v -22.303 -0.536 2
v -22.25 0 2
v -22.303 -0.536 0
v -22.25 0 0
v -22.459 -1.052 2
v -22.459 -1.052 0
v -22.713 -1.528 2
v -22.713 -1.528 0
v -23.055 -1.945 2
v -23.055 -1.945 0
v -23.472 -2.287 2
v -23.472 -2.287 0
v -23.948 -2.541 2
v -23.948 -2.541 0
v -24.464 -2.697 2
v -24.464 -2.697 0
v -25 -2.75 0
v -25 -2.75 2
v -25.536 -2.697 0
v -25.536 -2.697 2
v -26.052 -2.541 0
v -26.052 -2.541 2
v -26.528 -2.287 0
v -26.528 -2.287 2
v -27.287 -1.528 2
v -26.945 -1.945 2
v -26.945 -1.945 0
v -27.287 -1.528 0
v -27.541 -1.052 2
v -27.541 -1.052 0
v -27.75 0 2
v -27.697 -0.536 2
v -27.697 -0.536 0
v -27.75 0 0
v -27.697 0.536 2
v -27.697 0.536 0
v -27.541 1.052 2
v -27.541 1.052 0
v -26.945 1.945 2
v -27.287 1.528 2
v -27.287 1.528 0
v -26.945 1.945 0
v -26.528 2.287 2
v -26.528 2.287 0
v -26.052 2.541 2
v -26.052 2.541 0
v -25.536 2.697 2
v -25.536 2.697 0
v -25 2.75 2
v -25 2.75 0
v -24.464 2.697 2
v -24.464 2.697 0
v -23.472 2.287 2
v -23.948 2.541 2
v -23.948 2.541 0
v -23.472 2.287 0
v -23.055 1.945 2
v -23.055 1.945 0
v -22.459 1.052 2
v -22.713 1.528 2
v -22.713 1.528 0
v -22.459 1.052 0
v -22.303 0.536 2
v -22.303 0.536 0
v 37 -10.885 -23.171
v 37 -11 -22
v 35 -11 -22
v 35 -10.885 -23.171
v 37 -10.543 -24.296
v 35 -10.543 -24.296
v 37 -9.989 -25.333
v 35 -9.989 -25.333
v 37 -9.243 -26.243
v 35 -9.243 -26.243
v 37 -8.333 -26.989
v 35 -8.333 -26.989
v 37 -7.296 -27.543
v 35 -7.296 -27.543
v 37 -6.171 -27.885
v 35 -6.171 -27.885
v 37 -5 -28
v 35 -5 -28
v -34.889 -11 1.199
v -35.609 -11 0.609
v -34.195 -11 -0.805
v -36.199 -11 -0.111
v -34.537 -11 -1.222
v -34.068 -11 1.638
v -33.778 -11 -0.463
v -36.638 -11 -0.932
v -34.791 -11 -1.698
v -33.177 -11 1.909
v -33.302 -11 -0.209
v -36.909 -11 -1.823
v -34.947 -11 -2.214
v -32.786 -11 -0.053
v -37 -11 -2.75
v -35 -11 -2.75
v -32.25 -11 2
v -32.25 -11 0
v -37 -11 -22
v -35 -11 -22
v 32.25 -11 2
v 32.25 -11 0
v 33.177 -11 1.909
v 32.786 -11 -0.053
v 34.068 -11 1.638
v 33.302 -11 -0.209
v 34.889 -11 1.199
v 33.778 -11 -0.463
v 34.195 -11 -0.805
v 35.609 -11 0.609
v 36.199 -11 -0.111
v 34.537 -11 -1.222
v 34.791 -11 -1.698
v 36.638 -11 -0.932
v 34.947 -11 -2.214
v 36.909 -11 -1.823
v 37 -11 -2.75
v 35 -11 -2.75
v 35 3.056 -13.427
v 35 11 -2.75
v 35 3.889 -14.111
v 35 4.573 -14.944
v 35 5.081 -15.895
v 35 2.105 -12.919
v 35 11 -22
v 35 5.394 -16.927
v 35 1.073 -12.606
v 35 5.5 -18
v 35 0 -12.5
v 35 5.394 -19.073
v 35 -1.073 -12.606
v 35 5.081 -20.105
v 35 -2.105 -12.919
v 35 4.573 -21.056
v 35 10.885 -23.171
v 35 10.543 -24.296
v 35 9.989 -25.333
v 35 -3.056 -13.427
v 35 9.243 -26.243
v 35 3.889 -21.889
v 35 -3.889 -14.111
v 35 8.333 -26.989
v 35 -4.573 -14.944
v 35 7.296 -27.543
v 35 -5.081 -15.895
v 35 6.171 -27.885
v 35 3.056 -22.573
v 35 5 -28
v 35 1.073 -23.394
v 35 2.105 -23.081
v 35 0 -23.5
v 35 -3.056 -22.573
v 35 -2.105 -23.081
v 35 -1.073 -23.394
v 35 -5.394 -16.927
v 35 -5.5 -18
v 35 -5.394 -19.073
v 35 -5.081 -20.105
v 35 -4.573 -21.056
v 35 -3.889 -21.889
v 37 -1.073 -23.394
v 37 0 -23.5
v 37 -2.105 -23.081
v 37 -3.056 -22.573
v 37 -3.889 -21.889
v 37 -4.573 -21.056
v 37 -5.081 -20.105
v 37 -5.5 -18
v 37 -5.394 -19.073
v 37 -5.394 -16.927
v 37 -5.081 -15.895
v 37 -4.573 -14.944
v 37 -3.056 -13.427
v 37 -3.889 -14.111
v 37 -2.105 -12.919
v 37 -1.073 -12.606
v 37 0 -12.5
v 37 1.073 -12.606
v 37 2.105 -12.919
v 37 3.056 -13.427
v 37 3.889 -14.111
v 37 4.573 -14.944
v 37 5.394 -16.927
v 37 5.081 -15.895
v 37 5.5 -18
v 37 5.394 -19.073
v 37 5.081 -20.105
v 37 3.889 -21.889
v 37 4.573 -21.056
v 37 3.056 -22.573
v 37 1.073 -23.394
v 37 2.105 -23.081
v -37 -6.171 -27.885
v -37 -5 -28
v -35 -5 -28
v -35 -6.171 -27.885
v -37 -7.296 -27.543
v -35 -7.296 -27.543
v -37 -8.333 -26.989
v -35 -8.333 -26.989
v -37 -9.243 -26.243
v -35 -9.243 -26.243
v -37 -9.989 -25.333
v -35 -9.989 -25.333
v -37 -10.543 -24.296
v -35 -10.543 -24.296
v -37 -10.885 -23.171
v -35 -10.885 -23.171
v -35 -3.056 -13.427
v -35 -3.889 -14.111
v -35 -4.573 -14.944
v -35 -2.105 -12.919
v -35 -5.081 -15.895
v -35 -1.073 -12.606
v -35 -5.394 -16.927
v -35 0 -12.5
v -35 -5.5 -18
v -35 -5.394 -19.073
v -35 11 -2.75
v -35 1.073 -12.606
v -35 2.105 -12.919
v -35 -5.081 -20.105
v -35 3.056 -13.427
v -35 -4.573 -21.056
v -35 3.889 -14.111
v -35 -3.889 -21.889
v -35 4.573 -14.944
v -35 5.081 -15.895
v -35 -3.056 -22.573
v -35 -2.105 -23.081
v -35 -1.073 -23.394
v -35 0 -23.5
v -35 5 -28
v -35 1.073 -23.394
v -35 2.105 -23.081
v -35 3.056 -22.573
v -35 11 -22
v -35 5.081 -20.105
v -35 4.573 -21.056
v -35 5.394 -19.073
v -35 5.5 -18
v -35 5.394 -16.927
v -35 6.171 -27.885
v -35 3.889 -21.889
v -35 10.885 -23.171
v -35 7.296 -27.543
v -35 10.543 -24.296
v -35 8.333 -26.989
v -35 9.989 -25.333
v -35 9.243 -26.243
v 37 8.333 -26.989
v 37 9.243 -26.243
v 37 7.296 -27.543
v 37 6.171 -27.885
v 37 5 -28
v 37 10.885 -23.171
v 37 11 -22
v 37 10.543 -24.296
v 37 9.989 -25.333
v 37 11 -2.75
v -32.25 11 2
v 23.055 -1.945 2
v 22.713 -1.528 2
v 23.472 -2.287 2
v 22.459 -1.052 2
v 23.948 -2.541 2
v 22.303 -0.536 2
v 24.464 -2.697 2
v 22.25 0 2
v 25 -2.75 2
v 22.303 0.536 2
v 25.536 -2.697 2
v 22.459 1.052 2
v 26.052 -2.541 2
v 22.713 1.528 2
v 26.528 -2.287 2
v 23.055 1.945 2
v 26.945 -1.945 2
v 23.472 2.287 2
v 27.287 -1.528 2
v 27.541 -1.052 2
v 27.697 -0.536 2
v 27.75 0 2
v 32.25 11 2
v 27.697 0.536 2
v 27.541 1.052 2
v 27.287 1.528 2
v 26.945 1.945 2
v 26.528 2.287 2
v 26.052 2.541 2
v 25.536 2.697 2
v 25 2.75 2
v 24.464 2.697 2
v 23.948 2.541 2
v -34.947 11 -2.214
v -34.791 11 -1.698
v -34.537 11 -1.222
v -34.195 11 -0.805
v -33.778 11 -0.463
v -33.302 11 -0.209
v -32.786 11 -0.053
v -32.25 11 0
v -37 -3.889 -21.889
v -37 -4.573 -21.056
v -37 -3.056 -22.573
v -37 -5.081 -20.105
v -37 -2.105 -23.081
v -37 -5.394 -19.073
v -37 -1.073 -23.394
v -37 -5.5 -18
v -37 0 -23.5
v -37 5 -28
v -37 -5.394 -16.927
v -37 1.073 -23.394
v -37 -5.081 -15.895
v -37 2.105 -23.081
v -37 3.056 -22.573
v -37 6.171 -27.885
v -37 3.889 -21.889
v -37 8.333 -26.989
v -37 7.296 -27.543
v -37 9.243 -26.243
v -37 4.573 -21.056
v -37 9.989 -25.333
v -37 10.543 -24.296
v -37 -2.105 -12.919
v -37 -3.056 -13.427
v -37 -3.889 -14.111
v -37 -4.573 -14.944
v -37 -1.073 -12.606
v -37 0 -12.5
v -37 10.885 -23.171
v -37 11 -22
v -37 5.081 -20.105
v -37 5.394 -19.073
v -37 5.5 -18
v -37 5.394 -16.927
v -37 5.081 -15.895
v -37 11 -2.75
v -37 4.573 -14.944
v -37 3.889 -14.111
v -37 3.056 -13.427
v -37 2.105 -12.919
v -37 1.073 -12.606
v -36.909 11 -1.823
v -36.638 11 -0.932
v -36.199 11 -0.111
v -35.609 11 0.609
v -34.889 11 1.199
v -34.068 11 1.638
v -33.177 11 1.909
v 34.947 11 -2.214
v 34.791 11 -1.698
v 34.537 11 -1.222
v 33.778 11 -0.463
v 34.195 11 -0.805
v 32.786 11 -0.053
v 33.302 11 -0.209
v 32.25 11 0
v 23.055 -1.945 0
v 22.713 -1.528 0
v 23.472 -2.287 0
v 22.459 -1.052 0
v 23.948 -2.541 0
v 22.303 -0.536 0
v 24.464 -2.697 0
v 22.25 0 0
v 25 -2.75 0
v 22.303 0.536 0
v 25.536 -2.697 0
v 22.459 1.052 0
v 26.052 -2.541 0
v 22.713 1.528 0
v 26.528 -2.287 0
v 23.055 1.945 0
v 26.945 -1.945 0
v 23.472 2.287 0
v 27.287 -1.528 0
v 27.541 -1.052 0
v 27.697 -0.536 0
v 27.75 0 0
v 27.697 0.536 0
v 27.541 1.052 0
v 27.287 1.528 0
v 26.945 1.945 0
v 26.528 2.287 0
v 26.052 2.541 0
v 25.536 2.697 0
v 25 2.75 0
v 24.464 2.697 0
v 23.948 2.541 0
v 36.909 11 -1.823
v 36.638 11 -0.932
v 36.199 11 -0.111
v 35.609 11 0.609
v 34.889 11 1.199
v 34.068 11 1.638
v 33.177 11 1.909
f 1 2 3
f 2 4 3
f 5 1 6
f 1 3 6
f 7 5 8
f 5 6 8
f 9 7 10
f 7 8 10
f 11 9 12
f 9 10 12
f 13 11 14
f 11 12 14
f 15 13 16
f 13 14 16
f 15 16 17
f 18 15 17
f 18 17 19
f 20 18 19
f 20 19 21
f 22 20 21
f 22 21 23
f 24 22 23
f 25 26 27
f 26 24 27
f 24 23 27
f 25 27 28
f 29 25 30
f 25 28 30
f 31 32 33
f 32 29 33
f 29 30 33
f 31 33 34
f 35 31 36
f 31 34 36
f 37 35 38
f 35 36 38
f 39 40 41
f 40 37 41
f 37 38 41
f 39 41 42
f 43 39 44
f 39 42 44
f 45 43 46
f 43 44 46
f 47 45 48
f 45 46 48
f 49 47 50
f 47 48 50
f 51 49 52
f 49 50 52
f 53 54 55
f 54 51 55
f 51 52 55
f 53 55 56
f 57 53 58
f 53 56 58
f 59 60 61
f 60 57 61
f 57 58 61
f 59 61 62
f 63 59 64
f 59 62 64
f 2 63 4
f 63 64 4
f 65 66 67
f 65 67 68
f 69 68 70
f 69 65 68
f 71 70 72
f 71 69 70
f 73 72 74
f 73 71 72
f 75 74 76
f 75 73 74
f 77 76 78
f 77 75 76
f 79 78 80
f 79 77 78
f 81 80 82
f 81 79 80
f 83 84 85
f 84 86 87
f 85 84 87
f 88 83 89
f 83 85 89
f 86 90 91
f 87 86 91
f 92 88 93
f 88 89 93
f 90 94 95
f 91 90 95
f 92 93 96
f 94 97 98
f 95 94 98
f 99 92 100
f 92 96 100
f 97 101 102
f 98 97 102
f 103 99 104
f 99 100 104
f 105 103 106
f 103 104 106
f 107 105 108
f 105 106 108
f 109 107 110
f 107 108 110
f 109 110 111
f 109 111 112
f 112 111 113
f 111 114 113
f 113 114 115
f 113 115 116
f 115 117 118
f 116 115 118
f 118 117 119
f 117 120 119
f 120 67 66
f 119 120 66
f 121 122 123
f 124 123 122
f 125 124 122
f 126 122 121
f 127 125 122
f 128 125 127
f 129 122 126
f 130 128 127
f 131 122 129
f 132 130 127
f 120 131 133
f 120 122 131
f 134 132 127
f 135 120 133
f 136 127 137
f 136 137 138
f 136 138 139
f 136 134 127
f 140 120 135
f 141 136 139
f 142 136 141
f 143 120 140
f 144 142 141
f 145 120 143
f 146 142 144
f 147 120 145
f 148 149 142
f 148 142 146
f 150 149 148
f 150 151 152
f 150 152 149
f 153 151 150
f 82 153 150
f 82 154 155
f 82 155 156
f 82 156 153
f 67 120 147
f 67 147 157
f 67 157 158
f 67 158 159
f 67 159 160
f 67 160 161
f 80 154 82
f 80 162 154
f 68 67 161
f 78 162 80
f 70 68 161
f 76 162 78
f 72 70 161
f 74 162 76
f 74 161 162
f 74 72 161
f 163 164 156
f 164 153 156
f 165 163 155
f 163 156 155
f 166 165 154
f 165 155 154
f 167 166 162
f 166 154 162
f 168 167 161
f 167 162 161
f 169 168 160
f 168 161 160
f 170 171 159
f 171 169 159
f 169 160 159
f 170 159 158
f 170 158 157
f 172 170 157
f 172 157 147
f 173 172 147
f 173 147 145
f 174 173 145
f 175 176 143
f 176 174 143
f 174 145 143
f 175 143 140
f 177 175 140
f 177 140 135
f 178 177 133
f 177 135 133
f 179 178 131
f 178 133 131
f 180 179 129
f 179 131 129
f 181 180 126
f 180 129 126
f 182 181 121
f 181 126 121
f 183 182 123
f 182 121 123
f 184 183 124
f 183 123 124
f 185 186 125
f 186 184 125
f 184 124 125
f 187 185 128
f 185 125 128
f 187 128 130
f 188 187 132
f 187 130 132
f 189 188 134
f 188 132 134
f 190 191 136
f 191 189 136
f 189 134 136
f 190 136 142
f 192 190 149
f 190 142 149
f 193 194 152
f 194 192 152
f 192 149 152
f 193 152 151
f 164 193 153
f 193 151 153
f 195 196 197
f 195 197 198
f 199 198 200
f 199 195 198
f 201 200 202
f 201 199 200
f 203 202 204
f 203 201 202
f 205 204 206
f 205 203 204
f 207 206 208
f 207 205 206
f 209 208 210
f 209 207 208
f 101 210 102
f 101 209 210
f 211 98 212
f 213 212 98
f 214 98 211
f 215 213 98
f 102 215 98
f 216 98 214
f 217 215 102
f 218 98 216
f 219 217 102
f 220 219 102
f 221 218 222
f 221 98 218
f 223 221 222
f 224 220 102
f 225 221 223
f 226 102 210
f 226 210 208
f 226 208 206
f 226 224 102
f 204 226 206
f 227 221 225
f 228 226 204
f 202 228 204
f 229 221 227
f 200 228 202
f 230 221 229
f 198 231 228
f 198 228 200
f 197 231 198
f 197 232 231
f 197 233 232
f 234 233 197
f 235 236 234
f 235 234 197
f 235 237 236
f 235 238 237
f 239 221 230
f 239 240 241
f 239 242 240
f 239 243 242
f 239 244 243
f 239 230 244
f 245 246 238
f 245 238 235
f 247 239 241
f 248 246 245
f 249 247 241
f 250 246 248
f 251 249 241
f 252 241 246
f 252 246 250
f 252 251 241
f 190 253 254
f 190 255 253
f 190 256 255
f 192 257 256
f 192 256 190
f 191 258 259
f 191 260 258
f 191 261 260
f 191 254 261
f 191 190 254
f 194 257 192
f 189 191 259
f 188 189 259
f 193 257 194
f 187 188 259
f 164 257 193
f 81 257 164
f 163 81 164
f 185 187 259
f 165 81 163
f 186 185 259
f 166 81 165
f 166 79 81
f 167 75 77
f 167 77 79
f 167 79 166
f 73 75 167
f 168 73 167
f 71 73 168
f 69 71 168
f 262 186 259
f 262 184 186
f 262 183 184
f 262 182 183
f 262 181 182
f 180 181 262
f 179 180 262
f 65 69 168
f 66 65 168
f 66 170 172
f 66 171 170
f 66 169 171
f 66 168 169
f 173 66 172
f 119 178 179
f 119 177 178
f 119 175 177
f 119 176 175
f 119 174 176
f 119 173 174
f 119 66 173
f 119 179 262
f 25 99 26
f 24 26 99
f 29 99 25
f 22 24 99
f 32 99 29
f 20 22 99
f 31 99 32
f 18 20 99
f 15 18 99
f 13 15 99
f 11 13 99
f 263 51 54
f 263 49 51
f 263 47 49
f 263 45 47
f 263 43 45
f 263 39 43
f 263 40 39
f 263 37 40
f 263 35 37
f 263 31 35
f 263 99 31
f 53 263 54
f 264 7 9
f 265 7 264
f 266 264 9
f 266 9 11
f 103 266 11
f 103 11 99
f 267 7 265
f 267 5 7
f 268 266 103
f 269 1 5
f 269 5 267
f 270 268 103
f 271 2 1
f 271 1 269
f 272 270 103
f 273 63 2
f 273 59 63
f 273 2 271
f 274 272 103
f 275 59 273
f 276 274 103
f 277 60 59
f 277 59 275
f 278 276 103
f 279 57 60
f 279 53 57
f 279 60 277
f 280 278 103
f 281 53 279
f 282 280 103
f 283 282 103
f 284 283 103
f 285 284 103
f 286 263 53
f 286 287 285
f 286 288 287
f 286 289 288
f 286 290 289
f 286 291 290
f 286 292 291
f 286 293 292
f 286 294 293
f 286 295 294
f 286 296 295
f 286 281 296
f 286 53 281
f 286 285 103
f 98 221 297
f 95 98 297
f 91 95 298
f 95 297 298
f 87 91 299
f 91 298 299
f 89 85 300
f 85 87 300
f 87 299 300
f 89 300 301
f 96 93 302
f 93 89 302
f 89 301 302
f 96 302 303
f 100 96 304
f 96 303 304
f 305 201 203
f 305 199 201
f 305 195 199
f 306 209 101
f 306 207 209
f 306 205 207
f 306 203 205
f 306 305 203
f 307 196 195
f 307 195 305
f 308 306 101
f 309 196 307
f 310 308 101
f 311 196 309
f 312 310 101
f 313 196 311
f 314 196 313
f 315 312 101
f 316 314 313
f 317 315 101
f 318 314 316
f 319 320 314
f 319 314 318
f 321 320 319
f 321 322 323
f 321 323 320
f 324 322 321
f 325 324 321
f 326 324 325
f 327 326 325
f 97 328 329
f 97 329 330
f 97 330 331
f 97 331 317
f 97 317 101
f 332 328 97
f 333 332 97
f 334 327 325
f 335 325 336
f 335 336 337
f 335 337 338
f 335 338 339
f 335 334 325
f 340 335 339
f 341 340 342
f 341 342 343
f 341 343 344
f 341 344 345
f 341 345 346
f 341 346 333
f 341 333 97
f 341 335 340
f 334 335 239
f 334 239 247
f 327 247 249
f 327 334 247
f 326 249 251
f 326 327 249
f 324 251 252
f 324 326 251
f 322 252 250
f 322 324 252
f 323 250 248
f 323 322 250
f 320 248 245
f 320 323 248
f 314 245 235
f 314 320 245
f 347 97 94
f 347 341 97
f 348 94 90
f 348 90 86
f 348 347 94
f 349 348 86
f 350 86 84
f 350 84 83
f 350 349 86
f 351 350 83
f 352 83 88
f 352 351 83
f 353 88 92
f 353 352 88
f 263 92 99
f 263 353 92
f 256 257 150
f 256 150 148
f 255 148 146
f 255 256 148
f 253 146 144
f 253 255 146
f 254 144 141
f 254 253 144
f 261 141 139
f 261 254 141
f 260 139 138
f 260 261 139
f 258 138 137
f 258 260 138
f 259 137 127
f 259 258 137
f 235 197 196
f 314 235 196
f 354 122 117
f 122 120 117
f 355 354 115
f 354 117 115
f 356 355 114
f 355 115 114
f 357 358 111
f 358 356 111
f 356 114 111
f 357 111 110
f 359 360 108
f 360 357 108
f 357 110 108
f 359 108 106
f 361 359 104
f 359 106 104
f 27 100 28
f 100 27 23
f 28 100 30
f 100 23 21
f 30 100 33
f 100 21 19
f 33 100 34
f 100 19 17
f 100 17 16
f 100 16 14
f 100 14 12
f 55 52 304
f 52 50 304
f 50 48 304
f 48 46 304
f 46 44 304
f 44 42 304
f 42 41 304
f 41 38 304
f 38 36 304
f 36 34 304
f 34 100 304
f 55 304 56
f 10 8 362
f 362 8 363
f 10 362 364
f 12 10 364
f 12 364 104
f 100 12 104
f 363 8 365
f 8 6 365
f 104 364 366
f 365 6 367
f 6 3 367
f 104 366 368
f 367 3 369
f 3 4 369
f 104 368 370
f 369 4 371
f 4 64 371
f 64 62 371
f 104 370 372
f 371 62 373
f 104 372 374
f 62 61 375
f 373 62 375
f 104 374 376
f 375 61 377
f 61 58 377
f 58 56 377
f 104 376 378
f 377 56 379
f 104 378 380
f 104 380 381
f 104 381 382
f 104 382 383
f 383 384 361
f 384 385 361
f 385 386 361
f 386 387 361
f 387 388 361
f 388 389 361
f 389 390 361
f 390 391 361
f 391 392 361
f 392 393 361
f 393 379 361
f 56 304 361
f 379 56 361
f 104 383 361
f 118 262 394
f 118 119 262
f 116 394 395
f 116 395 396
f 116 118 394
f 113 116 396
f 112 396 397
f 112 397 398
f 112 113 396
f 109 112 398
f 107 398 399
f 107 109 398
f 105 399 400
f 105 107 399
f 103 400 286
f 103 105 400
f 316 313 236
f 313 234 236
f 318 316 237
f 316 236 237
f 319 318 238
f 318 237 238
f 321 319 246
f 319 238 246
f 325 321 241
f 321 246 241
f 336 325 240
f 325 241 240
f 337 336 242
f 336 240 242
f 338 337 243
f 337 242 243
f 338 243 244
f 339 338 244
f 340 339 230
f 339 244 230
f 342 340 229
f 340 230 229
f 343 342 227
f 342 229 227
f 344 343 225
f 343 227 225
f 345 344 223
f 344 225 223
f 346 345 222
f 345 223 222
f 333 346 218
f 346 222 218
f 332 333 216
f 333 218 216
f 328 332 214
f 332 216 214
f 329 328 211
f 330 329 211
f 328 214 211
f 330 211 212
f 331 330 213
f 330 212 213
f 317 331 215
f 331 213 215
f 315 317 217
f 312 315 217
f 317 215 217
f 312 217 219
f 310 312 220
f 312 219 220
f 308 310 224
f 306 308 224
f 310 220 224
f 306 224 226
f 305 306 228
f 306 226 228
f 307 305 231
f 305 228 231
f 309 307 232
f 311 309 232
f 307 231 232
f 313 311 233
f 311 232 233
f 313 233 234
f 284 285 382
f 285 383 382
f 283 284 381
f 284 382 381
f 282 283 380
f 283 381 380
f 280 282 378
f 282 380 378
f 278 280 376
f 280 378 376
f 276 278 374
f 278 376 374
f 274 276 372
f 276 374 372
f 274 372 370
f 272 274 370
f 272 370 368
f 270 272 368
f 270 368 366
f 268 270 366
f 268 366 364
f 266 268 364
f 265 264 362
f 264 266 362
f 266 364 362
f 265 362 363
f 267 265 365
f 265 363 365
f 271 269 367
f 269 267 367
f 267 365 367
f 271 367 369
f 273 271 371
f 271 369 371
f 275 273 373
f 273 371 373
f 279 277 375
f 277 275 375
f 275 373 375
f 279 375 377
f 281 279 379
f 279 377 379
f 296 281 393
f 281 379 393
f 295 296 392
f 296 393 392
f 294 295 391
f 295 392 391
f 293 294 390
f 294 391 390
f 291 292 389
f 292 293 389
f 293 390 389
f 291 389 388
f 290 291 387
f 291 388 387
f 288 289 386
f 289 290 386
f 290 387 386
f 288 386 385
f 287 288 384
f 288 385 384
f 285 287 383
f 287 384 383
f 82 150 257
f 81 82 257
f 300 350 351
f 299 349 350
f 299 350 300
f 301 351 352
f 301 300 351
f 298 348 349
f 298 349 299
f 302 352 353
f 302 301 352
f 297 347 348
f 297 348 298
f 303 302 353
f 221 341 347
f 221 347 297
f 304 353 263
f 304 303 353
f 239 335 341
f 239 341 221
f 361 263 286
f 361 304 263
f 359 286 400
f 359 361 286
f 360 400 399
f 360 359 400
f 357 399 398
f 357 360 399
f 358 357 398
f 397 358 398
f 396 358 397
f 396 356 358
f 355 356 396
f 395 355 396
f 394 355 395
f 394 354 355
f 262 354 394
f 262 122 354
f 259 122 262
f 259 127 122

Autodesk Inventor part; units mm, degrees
ref_plane "YZ Plane" through (0, 0, 0) normal (1, 0, 0) x (0, 1, 0)
ref_plane "XZ Plane" through (0, 0, 0) normal (0, 1, 0) x (-1, 0, 0)
ref_plane "XY Plane" through (0, 0, 0) normal (0, 0, 1) x (1, 0, 0)
sketch "Sketch1" plane through (0, 0, 0) normal (0, 0, 1) x (1, 0, 0)
  line L0 (-35, -11) -> (35, -11)
  line L1 (35, -11) -> (35, 11)
  line L2 (35, 11) -> (-35, 11)
  line L3 (-35, 11) -> (-35, -11)
  line L4 (-35, -11) -> (35, 11) construction
  line L5 (35, -11) -> (-35, 11) construction
  circle A0 centre (-25, 0) radius 2.75
  circle A1 centre (25, 0) radius 2.75
  line L6 (0, 11) -> (0, -18.7198) construction
  point P0 (0, 0)
  dimension "d154" = 70
  dimension "d155" = 22
  dimension "d197" = 50
  dimension "d198" = 5.5
extrude "Plate5" add sketch "Sketch1" along normal blind 2
sketch "Sketch10" plane through (-37, 11, 2) normal (1, 0, 0) x (0, 1, 0)
  line L0 (-22, 0) -> (0, 0)
  line L1 (0, 0) -> (0, -30)
  line L2 (0, -30) -> (-22, -30)
  line L3 (-22, -30) -> (-22, 0)
edge flange "Flange4" height 30 angle 90 thickness 2 bend radius 2.75 thickness toward (1, 0, 0) relief round relief width 2 relief depth 1 corner gap 2.75 corner form 0 edges at (-35, 0, 0) (35, 0, 0) wall of the first edge with corners at (-37, -11, 2) (-37, 11, 2) (-37, 11, -28) (-37, -11, -28)
bend "Bend4"
corner "Corner4"
sketch "Sketch11" plane through (-35, -11, -28) normal (1, 0, 0) x (0, 0, -1)
  line L0 (-25.25, 22) -> (-25.25, 0) construction
  line L1 (-25.25, 0) -> (0, 0) construction
  line L2 (0, 0) -> (0, 22) construction
  line L3 (-25.25, 22) -> (0, 22) construction
  circle A0 centre (-10, 11) radius 5.5
  point P0 (-28, 11)
  point P1 (0, 11)
  dimension "d192" = 11
  dimension "d193" = 10
extrude "Cut3" cut sketch "Sketch11" against normal blind 2
mirror "Mirror1" about plane through (0, 0, 0) normal (1, 0, 0) of "Cut3"
fillet "Corner Round3" radius 6 4 edges at (-36, 11, -28) (-36, -11, -28) (36, -11, -28) (36, 11, -28)
properties part number "TKS 3525 FDS diam support" material "Stainless Steel"
